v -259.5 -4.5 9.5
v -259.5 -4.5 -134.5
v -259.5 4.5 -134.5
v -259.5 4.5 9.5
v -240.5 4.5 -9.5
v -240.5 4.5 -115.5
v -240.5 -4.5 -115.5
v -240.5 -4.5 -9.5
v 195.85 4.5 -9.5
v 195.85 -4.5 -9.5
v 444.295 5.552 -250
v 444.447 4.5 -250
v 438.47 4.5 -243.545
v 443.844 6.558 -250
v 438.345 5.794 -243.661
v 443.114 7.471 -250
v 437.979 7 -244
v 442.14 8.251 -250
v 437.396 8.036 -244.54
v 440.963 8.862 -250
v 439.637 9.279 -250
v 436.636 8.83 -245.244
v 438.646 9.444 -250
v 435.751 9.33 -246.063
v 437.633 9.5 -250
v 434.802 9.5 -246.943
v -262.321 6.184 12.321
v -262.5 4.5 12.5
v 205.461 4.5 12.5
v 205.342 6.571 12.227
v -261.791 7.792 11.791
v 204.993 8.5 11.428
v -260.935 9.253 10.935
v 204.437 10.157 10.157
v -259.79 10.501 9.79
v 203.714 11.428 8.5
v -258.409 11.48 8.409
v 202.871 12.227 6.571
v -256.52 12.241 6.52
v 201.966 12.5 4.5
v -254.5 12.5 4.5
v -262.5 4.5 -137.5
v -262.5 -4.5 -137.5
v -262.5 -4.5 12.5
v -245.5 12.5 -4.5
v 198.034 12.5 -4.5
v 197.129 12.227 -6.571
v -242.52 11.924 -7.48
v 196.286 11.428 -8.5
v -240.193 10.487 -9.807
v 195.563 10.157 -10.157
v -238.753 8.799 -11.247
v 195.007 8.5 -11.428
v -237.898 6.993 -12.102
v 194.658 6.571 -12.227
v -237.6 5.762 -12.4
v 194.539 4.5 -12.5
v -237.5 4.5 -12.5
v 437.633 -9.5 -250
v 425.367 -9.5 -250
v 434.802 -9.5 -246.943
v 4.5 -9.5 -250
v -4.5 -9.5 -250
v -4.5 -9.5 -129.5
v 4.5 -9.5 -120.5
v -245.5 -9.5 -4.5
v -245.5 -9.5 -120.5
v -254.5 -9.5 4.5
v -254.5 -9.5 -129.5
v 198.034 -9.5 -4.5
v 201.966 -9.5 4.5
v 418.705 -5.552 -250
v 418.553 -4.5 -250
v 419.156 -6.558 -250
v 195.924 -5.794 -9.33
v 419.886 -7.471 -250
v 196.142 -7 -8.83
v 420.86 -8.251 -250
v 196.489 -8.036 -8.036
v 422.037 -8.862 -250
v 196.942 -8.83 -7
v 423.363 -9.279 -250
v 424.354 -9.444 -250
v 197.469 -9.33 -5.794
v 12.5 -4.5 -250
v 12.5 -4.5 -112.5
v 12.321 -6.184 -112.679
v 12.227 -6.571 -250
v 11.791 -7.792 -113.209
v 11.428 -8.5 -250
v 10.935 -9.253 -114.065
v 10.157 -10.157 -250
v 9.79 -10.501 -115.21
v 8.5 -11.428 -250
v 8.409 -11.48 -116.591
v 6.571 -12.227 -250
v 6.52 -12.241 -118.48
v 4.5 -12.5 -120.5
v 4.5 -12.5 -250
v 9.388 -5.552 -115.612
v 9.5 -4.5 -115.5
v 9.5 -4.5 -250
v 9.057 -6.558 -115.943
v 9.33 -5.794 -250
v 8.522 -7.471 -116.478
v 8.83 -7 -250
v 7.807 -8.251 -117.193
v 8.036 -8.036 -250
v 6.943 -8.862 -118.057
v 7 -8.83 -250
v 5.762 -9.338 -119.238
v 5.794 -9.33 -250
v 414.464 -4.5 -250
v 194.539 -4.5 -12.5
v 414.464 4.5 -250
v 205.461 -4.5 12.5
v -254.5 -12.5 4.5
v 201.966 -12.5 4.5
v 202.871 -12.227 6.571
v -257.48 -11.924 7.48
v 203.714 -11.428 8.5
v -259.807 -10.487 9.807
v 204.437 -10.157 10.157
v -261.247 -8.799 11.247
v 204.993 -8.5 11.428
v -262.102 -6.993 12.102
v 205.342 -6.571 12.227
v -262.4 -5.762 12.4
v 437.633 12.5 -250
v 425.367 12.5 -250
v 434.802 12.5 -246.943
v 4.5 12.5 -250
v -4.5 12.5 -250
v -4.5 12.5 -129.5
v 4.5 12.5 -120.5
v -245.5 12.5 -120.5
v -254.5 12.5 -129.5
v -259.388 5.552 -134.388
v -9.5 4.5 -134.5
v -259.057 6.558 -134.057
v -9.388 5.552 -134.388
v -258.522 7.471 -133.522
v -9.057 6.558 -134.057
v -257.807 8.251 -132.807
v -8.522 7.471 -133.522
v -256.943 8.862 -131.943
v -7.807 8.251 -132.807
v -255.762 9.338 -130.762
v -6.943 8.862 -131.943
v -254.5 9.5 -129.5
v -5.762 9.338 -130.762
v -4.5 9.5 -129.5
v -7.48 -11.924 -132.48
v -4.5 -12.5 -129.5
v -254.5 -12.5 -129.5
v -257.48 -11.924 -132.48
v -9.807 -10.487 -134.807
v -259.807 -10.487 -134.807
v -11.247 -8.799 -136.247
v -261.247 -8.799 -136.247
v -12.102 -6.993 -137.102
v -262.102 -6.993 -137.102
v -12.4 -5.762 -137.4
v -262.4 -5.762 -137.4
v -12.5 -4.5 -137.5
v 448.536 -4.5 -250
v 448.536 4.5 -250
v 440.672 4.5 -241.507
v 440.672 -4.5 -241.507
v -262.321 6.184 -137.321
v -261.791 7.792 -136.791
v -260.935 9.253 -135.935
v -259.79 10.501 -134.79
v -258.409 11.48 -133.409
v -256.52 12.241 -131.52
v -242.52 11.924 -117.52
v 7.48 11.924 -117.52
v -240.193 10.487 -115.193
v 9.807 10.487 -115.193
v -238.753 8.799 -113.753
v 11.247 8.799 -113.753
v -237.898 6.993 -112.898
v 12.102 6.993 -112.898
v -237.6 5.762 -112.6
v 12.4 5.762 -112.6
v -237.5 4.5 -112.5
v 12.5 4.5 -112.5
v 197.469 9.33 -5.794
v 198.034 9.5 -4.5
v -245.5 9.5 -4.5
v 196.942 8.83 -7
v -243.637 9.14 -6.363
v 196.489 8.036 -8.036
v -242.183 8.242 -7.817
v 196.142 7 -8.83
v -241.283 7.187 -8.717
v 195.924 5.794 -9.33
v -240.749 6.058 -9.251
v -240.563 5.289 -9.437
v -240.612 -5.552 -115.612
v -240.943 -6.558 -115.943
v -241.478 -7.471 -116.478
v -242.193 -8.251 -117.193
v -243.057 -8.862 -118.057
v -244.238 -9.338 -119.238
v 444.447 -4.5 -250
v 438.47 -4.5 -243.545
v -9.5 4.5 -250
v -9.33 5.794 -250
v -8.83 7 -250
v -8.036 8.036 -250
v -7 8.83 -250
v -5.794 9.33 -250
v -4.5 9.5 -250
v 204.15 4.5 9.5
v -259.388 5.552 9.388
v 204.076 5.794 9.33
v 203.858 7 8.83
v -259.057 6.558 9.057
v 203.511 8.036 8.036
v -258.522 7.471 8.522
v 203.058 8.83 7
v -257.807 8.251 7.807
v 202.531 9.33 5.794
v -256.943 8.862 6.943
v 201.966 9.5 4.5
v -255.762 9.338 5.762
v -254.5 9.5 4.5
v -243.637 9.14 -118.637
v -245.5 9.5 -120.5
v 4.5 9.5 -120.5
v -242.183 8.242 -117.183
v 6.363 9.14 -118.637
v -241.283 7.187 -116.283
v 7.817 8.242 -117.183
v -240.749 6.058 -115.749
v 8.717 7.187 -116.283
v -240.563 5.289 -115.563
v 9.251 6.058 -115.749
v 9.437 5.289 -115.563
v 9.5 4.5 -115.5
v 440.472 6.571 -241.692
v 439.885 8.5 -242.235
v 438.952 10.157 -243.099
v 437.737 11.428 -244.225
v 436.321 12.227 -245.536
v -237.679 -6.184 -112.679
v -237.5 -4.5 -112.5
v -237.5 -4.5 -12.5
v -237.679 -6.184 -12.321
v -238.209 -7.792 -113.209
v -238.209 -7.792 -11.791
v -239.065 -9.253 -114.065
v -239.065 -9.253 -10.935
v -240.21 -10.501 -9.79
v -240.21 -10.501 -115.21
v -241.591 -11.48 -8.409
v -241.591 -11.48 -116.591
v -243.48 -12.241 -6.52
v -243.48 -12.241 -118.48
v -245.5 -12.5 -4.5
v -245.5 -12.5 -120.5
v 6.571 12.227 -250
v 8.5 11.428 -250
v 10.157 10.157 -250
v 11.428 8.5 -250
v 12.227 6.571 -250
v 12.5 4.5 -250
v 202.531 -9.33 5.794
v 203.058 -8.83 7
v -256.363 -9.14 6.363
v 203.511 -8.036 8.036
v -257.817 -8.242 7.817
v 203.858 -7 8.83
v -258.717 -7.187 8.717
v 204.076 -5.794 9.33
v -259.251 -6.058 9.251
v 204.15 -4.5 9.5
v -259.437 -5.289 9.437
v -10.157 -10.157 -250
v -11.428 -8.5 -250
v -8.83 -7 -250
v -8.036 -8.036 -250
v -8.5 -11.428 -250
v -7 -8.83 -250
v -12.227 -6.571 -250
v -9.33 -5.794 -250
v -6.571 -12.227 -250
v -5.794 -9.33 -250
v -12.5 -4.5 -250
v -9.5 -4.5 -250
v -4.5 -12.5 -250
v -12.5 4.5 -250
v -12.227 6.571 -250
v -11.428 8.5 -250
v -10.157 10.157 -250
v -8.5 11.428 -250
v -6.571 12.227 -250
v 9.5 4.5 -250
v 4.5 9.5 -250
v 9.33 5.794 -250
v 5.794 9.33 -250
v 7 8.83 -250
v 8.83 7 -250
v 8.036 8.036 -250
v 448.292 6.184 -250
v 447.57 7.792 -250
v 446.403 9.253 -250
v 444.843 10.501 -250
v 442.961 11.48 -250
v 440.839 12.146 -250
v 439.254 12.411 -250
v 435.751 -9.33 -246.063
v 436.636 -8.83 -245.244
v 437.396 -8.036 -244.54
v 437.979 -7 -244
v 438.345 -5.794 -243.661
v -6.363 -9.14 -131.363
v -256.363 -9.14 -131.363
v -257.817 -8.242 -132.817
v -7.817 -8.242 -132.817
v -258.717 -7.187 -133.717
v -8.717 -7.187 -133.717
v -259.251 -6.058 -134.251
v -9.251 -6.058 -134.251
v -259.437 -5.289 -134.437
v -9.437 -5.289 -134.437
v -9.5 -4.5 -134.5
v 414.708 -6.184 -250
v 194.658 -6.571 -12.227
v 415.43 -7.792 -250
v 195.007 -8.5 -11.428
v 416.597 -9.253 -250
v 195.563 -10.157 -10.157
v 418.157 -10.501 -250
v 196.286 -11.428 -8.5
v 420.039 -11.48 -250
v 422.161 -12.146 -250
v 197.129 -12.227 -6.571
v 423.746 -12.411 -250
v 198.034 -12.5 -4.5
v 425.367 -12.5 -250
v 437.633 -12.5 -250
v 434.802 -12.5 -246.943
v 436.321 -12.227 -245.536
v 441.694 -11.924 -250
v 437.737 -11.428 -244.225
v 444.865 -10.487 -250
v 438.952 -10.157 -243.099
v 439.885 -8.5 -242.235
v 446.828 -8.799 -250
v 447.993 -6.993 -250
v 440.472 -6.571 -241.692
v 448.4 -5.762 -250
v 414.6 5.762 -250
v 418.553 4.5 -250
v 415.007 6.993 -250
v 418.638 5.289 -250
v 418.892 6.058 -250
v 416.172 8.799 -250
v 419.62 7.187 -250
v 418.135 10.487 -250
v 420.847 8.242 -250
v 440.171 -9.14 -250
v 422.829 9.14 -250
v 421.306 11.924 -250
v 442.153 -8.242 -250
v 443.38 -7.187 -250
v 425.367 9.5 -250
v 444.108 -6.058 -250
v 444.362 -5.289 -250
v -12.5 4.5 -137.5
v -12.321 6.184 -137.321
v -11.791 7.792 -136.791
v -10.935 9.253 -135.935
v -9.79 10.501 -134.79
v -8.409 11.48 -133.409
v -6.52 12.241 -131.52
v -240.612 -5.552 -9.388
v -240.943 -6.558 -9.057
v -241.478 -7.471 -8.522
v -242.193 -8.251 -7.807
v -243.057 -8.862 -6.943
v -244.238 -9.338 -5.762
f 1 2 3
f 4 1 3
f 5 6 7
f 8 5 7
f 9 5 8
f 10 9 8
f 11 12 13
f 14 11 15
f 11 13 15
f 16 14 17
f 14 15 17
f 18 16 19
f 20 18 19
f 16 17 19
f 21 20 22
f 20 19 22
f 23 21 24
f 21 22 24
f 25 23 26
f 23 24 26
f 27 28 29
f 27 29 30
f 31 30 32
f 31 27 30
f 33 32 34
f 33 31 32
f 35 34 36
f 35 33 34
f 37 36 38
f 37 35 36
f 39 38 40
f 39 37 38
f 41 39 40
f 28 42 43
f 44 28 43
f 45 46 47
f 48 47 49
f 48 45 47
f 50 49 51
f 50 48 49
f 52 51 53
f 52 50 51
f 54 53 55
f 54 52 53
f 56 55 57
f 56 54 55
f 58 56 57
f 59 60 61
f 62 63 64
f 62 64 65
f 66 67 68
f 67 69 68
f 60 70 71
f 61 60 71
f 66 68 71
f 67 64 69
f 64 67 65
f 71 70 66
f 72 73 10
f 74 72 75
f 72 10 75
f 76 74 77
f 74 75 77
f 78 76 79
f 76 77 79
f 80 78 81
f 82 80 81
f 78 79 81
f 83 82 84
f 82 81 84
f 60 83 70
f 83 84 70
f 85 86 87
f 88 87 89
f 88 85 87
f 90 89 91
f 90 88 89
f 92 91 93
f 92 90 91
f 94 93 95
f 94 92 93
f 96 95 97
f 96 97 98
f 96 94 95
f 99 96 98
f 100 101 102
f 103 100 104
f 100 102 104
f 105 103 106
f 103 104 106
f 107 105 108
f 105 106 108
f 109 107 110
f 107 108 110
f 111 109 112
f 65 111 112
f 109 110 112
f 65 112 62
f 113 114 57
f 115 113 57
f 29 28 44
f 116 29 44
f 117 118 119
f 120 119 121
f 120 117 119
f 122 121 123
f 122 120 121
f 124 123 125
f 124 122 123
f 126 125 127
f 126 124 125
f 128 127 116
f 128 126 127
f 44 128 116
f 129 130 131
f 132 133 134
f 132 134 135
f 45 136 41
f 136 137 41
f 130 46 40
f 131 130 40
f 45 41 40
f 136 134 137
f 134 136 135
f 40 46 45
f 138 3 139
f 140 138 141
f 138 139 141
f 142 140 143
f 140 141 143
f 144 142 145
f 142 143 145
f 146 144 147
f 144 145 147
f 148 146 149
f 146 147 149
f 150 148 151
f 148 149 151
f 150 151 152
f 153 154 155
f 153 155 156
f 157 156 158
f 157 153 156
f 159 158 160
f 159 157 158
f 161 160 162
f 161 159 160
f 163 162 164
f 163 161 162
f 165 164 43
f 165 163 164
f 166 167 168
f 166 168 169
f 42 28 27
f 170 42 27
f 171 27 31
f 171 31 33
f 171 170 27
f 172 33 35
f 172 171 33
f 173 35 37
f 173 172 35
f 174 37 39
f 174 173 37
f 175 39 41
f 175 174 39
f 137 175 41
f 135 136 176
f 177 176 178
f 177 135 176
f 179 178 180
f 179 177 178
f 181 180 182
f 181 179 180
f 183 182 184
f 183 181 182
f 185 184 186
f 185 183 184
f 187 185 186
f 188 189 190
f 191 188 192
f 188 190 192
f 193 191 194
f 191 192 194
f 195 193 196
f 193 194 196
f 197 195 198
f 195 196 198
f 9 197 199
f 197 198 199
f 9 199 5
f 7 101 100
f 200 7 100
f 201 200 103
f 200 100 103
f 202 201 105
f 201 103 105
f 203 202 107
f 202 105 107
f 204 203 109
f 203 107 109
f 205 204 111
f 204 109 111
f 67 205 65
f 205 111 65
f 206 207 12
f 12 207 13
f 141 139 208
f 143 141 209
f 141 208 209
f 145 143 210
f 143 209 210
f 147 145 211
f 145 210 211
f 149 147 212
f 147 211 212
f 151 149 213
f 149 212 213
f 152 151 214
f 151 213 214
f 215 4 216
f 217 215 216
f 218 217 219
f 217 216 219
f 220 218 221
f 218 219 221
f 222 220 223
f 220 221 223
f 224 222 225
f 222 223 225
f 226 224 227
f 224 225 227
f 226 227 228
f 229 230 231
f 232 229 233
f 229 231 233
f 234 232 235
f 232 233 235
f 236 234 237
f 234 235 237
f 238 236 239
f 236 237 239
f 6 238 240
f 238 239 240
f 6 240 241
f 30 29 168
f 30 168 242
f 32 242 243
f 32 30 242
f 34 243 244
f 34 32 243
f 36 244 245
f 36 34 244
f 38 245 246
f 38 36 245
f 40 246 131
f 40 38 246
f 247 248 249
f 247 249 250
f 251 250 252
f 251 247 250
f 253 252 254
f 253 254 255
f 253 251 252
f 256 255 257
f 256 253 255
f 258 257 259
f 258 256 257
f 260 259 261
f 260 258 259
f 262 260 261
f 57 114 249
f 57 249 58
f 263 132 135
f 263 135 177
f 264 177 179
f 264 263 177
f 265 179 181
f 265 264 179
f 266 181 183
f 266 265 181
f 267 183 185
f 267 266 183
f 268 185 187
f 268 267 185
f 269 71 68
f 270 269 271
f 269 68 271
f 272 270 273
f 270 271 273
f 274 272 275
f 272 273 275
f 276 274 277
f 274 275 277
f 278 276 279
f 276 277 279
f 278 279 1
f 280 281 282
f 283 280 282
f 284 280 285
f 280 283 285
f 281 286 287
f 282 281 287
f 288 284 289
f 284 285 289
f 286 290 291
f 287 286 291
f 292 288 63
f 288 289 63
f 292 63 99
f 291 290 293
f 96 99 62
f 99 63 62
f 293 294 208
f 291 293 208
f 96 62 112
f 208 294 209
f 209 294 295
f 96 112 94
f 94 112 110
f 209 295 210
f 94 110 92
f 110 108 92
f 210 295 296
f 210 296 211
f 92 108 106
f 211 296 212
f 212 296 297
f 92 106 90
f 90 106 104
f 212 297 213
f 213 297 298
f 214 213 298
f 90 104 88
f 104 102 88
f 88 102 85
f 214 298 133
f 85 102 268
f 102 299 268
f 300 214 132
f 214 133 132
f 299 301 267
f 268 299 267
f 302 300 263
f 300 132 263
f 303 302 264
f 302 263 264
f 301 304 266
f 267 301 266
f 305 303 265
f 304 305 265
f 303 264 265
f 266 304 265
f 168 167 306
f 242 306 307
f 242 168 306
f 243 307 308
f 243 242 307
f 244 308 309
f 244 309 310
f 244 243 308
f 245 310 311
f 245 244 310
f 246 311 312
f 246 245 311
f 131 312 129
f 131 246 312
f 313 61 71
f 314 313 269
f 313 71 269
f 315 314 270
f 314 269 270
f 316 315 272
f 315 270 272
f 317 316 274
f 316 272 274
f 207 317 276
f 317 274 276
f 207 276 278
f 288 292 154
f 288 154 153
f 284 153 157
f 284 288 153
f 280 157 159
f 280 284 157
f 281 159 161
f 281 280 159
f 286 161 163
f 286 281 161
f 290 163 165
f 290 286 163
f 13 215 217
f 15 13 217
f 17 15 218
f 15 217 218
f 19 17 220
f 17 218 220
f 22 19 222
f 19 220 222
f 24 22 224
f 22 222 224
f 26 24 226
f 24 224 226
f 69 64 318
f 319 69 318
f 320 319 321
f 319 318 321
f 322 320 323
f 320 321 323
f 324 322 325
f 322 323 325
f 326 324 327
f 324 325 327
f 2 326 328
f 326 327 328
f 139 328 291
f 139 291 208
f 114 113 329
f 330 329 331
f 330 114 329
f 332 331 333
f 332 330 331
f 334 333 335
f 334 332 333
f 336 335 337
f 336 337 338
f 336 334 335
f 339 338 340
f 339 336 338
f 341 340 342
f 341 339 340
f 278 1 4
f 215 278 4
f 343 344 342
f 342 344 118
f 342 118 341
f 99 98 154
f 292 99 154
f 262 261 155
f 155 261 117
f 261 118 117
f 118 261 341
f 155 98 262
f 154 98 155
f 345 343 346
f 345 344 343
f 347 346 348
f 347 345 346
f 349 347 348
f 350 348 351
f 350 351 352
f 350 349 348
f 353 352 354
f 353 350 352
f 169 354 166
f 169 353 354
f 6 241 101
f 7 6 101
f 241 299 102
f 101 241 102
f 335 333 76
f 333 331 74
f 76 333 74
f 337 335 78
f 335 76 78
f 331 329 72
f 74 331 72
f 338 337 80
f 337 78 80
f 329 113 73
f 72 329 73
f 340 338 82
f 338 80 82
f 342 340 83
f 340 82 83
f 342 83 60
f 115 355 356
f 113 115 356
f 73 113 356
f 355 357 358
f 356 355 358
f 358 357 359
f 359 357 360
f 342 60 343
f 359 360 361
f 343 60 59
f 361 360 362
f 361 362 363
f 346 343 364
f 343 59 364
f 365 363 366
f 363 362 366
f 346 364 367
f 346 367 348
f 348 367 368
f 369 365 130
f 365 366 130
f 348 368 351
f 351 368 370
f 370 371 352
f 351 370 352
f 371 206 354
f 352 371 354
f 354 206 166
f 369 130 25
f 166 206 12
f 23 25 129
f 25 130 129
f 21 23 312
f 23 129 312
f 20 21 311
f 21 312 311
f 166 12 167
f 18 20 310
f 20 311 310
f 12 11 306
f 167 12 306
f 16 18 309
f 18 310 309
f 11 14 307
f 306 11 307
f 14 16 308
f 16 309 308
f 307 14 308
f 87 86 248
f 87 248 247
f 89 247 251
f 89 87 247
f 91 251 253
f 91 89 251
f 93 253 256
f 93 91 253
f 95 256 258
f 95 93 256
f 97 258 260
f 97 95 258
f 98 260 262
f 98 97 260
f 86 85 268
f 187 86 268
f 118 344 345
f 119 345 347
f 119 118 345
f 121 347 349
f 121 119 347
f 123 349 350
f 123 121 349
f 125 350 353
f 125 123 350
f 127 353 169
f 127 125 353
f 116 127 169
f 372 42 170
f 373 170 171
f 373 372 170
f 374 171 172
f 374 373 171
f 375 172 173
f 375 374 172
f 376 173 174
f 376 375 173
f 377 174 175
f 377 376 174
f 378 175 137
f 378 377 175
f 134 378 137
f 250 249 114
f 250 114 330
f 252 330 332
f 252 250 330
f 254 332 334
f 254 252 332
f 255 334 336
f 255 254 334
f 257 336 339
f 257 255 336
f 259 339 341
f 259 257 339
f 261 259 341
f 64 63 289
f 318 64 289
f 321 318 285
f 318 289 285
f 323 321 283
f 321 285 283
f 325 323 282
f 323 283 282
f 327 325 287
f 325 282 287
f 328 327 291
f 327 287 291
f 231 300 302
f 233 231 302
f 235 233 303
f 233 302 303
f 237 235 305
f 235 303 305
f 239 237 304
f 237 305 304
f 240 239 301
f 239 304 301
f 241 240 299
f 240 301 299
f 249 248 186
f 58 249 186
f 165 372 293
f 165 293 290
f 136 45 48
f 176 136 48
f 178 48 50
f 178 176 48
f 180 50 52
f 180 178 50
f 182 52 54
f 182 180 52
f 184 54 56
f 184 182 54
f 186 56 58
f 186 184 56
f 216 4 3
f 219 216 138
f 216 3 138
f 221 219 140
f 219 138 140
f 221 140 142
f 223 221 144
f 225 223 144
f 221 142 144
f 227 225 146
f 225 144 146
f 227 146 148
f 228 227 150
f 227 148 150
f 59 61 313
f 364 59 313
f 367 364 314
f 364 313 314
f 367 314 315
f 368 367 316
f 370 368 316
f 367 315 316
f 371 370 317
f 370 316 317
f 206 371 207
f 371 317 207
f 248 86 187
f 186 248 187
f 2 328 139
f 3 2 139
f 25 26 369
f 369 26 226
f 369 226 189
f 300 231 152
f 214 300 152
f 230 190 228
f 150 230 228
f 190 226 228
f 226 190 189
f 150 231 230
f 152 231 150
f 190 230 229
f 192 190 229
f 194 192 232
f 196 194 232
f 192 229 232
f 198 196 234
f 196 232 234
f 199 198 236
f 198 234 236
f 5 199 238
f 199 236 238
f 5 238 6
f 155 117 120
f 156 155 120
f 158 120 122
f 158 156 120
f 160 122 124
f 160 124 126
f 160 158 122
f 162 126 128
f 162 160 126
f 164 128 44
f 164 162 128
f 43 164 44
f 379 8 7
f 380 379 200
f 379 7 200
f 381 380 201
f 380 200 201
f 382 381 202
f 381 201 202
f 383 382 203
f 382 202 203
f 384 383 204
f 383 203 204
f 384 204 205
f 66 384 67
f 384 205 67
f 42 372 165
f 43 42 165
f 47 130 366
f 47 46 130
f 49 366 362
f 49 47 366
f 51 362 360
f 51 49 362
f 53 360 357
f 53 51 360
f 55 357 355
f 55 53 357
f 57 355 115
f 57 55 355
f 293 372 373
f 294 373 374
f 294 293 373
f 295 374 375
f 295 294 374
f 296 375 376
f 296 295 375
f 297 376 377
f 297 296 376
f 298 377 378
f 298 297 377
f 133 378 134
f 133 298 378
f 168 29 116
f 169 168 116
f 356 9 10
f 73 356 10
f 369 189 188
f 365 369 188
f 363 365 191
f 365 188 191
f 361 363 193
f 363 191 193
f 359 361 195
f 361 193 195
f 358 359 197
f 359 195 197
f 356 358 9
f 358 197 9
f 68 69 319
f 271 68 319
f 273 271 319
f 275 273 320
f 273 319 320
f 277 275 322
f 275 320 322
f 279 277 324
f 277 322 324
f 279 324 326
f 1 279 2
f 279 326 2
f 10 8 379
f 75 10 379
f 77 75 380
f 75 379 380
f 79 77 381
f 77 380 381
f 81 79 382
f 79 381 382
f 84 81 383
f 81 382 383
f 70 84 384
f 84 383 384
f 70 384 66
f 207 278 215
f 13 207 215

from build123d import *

# Parameters (mm, degrees)
SKETCH11_W         = 135.340286593
SKETCH11_H         = 57.113739626
CUT_EXTRUDE1_DEPTH = 18.6646359


with BuildPart() as part:
    # Sweep-Thin1: sweep along a path in Sketch2
    with BuildLine(Plane(origin=(0, 0, 0), x_dir=(1, 0, 0), z_dir=(0, 1, 0))) as sweep_thin1_path:
        Line((439.99296617, 259.17166973), (431.5, 250))
        Line((431.5, 250), (200, 0))
        Line((200, 0), (0, 0))
        Line((0, 0), (-250, 0))
        Line((-250, 0), (-250, 125))
        Line((-250, 125), (0, 125))
        Line((0, 125), (0, 250))
    # Sketch6 → Sweep-Thin1 (sweep)
    with BuildSketch(Plane.XY.offset(-250)):
        with BuildLine():
            Line((4.5, 12.5), (-4.5, 12.5))
            ThreePointArc((-4.5, 12.5), (-10.156854249, 10.156854249), (-12.5, 4.5))
            Line((-12.5, 4.5), (-12.5, -4.5))
            ThreePointArc((-12.5, -4.5), (-10.156854249, -10.156854249), (-4.5, -12.5))
            Line((-4.5, -12.5), (4.5, -12.5))
            ThreePointArc((4.5, -12.5), (10.156854249, -10.156854249), (12.5, -4.5))
            Line((12.5, -4.5), (12.5, 4.5))
            ThreePointArc((12.5, 4.5), (10.156854249, 10.156854249), (4.5, 12.5))
        make_face()
        with BuildLine():
            Line((4.5, 9.5), (-4.5, 9.5))
            ThreePointArc((-4.5, 9.5), (-8.035533906, 8.035533906), (-9.5, 4.5))
            Line((-9.5, 4.5), (-9.5, -4.5))
            ThreePointArc((-9.5, -4.5), (-8.035533906, -8.035533906), (-4.5, -9.5))
            Line((-4.5, -9.5), (4.5, -9.5))
            ThreePointArc((4.5, -9.5), (8.035533906, -8.035533906), (9.5, -4.5))
            Line((9.5, -4.5), (9.5, 4.5))
            ThreePointArc((9.5, 4.5), (8.035533906, 8.035533906), (4.5, 9.5))
        make_face(mode=Mode.SUBTRACT)
    sweep(path=sweep_thin1_path.line, transition=Transition.RIGHT)

    # Sketch11 → Cut-Extrude1 (cut, through all)
    with BuildSketch(Plane.XY.offset(-250)):
        with Locations((387.319769347, 0)):
            Rectangle(SKETCH11_W, SKETCH11_H)
    extrude(amount=-CUT_EXTRUDE1_DEPTH, mode=Mode.SUBTRACT)


solid = part.part
